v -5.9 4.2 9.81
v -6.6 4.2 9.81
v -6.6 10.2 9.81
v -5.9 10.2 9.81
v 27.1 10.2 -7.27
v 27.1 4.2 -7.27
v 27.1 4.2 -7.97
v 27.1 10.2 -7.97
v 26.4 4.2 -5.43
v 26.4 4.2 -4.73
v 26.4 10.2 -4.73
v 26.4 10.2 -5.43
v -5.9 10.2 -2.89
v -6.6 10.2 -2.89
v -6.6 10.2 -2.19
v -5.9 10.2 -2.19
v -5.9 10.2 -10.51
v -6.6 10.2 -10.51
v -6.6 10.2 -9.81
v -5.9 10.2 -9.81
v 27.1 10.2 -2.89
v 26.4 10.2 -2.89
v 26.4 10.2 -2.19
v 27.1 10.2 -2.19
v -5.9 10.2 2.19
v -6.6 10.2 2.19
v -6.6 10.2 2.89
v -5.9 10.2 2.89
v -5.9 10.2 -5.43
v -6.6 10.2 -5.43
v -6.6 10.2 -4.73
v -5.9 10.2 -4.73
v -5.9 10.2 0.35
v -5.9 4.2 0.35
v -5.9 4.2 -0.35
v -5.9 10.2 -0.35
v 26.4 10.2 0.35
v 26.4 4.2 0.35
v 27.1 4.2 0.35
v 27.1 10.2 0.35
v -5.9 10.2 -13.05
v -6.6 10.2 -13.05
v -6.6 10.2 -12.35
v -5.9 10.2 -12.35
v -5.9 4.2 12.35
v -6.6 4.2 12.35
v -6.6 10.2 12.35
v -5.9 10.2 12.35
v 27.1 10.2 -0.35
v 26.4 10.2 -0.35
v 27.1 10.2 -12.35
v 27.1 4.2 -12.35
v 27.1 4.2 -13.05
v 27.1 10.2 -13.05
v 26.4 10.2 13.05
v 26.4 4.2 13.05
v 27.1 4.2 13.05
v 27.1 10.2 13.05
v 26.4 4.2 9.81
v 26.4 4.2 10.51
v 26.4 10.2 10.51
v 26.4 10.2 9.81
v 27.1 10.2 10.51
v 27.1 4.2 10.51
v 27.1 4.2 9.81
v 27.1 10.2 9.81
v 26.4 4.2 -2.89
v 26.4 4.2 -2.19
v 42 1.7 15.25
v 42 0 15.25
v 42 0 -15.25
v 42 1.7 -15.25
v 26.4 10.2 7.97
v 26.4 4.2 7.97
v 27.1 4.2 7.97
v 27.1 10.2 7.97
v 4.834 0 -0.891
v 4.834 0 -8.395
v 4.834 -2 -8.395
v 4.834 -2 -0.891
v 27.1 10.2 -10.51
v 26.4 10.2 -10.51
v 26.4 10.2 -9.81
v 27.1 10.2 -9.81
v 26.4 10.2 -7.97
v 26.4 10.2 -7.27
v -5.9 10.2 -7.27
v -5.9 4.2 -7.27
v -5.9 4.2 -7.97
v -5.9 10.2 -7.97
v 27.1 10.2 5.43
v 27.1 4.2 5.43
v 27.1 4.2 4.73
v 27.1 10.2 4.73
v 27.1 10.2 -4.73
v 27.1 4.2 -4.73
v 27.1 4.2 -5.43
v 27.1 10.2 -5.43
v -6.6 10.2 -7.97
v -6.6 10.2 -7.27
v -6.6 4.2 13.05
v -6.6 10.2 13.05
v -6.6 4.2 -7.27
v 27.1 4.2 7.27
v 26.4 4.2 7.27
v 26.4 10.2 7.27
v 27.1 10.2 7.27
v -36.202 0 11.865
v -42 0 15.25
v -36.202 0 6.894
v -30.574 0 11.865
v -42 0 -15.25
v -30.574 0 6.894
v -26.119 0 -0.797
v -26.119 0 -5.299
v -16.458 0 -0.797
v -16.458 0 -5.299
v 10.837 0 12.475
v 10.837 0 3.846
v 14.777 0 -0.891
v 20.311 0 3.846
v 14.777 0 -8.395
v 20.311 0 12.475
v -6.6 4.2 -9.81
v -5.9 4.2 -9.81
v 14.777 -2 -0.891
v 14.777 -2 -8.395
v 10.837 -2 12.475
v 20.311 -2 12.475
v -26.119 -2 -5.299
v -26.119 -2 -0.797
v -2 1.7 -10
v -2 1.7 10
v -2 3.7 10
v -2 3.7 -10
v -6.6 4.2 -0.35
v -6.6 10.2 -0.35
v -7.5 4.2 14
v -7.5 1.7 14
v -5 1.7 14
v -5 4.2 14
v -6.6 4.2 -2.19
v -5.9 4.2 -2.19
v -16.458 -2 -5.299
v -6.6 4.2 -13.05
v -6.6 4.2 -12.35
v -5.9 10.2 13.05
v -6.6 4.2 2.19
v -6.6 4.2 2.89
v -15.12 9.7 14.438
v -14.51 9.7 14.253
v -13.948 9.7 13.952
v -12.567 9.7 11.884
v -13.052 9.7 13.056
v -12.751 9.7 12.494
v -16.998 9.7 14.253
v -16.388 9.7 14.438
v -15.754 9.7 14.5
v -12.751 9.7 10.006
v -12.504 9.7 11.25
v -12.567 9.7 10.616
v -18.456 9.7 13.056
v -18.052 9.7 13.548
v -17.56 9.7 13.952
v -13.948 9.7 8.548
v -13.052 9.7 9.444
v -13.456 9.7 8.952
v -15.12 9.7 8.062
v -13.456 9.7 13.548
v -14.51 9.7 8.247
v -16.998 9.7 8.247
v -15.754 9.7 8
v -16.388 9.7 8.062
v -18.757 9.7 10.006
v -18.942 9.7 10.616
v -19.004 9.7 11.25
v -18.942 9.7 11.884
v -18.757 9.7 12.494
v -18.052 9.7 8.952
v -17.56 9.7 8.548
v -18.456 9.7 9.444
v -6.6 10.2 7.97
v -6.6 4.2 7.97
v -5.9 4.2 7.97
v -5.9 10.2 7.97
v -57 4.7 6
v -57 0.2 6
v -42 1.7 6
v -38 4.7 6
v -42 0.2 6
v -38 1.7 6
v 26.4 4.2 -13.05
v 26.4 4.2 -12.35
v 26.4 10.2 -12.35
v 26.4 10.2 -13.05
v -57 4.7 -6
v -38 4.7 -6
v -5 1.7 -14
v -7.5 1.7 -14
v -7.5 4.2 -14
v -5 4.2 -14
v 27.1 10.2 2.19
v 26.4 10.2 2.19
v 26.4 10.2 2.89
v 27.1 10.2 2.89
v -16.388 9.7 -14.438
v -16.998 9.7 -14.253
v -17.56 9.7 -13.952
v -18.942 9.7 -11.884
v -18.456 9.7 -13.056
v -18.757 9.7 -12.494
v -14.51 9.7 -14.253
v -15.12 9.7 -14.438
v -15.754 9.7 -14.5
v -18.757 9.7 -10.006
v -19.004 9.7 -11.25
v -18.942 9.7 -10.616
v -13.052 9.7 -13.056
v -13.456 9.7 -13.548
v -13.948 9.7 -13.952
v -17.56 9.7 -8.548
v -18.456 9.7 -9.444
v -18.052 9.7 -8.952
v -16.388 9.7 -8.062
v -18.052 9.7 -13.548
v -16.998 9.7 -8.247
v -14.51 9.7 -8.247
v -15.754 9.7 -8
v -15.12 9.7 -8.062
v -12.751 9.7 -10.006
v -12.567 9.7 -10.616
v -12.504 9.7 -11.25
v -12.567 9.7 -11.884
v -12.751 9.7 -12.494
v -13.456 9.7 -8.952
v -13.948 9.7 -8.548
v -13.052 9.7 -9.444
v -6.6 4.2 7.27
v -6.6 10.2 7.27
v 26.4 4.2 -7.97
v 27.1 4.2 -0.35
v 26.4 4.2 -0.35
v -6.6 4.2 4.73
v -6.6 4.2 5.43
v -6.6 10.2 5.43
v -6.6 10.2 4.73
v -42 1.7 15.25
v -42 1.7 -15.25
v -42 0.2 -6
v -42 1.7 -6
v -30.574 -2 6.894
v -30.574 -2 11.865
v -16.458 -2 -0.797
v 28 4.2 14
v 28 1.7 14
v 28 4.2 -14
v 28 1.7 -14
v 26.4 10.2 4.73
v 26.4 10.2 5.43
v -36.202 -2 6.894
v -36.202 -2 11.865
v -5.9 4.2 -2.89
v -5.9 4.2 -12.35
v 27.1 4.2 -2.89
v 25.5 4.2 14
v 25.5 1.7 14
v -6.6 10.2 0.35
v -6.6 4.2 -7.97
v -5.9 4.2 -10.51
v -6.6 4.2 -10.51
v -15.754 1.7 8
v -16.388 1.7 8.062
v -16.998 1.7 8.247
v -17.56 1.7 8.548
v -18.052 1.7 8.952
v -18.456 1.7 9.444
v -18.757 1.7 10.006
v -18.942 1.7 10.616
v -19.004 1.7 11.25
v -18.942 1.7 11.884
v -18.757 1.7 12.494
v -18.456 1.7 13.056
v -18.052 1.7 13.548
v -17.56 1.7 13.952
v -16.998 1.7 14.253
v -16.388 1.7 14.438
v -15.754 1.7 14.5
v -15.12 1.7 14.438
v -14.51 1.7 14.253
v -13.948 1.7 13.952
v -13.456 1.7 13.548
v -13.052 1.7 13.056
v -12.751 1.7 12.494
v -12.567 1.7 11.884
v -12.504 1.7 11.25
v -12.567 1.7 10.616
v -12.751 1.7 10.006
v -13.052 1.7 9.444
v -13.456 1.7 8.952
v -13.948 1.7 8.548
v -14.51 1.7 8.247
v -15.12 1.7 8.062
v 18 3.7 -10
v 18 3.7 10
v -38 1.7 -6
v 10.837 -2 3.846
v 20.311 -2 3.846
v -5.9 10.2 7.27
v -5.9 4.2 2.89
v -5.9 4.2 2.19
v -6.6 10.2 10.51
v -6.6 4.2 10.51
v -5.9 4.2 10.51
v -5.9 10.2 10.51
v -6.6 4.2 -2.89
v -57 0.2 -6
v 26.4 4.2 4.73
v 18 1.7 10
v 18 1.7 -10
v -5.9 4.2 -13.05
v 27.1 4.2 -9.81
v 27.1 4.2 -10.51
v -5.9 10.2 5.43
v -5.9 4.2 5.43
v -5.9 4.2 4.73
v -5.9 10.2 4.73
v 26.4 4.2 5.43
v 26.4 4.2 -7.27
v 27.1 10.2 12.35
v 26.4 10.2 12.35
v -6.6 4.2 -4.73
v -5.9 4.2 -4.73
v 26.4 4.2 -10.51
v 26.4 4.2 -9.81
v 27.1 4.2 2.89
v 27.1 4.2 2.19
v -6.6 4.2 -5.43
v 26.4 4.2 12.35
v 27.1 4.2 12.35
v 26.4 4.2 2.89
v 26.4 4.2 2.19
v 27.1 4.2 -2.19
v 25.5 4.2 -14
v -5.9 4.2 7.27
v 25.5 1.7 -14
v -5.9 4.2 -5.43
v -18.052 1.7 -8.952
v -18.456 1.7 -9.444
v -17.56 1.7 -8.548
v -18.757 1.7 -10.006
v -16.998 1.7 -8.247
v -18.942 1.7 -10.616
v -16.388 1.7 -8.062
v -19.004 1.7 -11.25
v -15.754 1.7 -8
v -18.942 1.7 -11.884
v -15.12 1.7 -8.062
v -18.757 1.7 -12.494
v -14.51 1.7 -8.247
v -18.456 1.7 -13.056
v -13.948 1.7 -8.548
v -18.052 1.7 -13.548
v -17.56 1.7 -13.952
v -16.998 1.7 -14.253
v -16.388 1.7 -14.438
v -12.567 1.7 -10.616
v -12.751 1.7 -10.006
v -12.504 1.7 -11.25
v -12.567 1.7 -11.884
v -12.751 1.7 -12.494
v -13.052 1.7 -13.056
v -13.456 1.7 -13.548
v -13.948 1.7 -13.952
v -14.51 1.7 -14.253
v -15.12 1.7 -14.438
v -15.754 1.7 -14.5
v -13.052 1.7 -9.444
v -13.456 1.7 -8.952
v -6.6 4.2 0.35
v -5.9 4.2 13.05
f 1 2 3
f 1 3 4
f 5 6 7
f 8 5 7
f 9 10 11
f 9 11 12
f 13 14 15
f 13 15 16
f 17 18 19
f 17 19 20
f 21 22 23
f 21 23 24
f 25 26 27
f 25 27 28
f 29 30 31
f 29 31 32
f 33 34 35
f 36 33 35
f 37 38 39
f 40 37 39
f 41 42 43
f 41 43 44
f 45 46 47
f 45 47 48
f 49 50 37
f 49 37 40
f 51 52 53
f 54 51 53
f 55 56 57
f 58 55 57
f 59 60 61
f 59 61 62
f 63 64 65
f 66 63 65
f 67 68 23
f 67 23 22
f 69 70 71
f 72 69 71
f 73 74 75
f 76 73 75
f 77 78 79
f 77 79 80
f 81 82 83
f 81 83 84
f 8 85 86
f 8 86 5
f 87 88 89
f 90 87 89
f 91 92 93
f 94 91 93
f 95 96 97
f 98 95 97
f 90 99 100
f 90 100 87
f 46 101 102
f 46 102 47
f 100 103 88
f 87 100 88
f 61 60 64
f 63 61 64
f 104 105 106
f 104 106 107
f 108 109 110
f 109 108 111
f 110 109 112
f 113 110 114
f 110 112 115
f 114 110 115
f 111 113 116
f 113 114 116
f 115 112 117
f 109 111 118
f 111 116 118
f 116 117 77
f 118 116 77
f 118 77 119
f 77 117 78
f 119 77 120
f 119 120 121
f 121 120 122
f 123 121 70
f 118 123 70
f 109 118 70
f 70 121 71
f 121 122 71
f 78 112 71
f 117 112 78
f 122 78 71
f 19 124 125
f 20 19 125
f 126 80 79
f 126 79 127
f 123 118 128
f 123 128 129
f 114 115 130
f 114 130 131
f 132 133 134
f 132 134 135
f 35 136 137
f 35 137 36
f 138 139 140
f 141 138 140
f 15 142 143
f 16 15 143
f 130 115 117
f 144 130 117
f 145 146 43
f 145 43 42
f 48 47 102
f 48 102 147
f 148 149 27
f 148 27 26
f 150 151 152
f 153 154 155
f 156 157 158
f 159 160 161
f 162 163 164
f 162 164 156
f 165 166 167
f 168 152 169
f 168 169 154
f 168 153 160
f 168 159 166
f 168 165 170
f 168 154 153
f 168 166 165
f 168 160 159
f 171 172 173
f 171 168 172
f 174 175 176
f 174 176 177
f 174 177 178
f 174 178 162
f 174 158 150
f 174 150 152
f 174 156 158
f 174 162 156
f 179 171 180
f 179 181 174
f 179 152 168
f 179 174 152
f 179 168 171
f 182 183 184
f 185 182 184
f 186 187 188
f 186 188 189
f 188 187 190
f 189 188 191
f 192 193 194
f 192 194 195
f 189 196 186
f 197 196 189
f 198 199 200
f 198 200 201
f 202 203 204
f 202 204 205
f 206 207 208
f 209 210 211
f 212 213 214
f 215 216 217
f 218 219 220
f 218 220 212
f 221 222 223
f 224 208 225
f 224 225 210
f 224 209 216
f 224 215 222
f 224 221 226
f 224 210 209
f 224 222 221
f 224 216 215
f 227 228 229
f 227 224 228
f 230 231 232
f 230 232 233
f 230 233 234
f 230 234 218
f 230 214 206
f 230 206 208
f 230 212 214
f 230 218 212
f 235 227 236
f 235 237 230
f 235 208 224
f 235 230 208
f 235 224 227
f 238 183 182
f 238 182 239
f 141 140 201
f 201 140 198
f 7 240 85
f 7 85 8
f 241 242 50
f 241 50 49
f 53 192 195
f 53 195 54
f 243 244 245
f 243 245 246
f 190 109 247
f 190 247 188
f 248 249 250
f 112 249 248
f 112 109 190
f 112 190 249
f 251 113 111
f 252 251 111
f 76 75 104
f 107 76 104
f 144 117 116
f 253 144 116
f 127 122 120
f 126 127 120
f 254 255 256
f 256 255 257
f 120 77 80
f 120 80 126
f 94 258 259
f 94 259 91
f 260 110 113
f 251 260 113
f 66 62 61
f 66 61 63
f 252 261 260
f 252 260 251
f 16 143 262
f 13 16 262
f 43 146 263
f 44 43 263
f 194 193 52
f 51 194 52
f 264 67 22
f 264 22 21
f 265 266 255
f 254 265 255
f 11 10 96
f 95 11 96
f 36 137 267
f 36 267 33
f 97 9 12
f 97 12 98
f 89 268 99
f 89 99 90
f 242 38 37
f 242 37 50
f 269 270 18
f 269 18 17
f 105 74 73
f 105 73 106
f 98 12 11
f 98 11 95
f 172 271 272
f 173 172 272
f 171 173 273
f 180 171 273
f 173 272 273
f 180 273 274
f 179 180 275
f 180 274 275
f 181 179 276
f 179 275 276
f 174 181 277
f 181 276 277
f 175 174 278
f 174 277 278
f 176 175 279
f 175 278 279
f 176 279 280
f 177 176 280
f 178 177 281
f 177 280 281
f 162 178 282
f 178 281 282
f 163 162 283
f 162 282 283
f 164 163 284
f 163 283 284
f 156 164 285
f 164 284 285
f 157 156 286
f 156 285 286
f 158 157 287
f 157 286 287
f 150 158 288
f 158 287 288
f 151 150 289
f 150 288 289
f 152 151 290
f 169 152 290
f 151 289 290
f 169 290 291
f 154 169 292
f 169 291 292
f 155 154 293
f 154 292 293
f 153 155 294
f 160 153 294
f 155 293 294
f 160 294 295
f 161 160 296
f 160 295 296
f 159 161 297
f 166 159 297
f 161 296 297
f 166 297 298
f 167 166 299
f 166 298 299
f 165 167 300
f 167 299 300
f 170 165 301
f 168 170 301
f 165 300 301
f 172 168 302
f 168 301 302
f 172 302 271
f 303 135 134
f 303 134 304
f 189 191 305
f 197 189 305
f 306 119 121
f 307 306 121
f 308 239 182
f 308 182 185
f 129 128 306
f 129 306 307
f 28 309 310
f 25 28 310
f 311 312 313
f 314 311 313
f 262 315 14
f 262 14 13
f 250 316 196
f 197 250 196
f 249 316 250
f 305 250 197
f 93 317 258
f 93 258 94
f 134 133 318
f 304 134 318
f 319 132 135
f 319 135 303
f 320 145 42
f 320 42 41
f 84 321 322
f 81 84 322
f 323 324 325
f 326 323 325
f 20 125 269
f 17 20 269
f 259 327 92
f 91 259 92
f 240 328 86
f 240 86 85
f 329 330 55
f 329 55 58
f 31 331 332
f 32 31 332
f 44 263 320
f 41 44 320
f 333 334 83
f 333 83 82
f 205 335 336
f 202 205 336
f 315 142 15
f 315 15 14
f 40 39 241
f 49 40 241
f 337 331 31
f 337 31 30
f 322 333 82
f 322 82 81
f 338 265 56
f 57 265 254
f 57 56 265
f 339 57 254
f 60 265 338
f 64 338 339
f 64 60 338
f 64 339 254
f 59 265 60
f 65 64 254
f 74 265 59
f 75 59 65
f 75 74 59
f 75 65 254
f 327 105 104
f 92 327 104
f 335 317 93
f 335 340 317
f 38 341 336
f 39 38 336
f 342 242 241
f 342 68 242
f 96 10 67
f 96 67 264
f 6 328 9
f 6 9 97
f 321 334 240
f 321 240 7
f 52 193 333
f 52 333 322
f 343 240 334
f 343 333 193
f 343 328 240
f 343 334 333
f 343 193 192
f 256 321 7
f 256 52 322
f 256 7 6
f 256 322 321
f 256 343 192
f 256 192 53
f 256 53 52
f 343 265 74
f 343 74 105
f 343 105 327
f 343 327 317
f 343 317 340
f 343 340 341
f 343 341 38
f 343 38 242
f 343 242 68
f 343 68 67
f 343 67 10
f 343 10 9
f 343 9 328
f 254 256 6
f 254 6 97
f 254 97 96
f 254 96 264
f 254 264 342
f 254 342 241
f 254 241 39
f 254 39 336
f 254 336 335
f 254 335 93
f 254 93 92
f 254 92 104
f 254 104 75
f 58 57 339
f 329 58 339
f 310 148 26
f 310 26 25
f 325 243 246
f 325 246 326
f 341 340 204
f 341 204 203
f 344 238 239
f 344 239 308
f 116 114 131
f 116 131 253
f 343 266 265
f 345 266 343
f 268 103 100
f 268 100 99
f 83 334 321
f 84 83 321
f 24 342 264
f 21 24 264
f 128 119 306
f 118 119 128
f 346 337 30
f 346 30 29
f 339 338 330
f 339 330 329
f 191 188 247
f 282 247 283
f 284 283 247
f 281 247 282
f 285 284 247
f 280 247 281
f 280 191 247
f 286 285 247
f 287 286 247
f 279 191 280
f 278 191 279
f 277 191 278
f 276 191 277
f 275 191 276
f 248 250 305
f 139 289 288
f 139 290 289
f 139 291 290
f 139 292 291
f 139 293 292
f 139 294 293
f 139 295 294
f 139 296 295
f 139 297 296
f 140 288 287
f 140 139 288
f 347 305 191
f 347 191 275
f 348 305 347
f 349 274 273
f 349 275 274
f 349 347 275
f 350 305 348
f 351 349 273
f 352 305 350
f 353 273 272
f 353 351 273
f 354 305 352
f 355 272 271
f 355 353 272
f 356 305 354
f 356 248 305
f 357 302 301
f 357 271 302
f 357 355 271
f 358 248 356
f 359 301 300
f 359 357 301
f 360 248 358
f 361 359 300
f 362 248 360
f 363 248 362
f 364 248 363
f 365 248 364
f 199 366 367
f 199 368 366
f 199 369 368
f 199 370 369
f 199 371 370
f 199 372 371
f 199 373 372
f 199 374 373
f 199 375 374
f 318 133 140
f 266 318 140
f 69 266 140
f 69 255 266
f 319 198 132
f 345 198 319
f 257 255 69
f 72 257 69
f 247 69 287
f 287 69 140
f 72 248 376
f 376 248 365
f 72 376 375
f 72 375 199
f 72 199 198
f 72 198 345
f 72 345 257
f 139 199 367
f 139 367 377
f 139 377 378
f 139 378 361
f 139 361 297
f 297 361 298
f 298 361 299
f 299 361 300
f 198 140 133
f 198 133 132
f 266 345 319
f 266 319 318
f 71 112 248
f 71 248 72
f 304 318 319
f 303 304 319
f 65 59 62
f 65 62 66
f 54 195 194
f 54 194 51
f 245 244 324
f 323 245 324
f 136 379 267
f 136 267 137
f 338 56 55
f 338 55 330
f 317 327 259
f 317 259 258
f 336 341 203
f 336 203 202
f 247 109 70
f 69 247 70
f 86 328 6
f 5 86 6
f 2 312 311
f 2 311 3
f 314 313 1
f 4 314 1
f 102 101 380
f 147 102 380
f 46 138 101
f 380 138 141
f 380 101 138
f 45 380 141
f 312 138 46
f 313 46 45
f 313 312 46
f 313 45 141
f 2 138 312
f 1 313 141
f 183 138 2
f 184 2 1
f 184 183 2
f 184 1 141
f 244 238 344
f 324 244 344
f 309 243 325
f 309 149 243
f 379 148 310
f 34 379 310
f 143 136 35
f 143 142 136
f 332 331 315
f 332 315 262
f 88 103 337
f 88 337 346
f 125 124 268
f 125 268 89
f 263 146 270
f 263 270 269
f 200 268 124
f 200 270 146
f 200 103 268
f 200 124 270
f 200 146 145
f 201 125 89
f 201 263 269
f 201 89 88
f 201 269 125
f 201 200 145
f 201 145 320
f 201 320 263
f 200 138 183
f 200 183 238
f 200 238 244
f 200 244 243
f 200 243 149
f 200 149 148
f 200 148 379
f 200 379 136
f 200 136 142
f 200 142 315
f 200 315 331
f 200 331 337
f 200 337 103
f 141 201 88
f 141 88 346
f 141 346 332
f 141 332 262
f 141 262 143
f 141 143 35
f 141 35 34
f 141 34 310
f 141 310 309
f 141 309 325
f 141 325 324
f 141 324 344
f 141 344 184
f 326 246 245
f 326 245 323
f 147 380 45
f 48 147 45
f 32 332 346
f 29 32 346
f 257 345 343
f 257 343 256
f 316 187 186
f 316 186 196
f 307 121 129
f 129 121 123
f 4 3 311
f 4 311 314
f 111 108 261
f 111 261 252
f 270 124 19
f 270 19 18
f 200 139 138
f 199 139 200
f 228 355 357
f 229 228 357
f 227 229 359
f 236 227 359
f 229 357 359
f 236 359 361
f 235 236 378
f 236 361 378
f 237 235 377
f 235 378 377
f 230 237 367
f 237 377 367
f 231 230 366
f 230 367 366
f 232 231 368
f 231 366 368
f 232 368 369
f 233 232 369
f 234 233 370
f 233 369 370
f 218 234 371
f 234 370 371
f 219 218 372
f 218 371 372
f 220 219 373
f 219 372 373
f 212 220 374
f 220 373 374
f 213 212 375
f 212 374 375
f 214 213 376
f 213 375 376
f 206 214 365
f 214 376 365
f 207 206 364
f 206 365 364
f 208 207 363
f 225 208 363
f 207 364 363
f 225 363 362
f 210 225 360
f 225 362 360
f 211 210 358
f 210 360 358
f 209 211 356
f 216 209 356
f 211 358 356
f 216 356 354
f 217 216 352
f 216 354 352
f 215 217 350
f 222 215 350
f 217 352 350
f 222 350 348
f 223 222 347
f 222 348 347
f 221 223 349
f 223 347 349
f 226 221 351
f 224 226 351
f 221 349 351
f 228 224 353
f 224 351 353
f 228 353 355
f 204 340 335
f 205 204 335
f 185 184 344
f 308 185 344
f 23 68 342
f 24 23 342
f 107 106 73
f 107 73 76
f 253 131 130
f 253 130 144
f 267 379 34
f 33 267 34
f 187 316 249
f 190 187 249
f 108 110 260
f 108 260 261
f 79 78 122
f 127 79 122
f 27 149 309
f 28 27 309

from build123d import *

# Parameters (mm, degrees)
SKETCH1_W                = 84
SKETCH1_H                = 30.5
BOSS_EXTRUDE1_DEPTH      = 1.7
BOSS_EXTRUDE2_DEPTH      = 3
BOSS_EXTRUDE2_DEPTH_BACK = 1.5
SKETCH2_W                = 19
SKETCH2_H                = 12
SKETCH3_W                = 20
SKETCH3_H                = 20
BOSS_EXTRUDE3_DEPTH      = 2
SKETCH4_W                = 5.627780268
SKETCH4_H                = 4.971205903
SKETCH4_W_2              = 9.661022794
SKETCH4_H_2              = 4.502224215
SKETCH4_W_3              = 9.473430118
SKETCH4_H_3              = 8.629263078
SKETCH4_W_4              = 9.942411808
SKETCH4_H_4              = 7.503707025
BOSS_EXTRUDE4_DEPTH      = 2
SKETCH5_R                = 3.25
BOSS_EXTRUDE5_DEPTH      = 8
SKETCH6_W                = 2.5
SKETCH6_H                = 28
BOSS_EXTRUDE6_DEPTH      = 2.5
SKETCH7_W                = 0.7
SKETCH7_H                = 0.7
BOSS_EXTRUDE7_DEPTH      = 6


with BuildPart() as part:
    # Sketch1 → Boss-Extrude1 (new body)
    with BuildSketch(Plane(origin=(0, 0, 0), x_dir=(1, 0, 0), z_dir=(0, 1, 0))):
        Rectangle(SKETCH1_W, SKETCH1_H)
    extrude(amount=BOSS_EXTRUDE1_DEPTH)

    # Sketch2 → Boss-Extrude2 (add, two sides: drawn at the far end of the back side and taken through both)
    with BuildSketch(Plane(origin=(0, 1.7, 0), x_dir=(1, 0, 0), z_dir=(0, 1, 0)).offset(-BOSS_EXTRUDE2_DEPTH_BACK)):
        with Locations((-47.5, 0)):
            Rectangle(SKETCH2_W, SKETCH2_H)
    extrude(amount=BOSS_EXTRUDE2_DEPTH + BOSS_EXTRUDE2_DEPTH_BACK)

    # Sketch3 → Boss-Extrude3 (add)
    with BuildSketch(Plane(origin=(0, 1.7, 0), x_dir=(1, 0, 0), z_dir=(0, 1, 0))):
        with Locations((8, 0)):
            Rectangle(SKETCH3_W, SKETCH3_H)
    extrude(amount=BOSS_EXTRUDE3_DEPTH)

    # Sketch4 → Boss-Extrude4 (add)
    with BuildSketch(Plane.XZ):
        with Locations((-33.387789234, 9.379633781)):
            Rectangle(SKETCH4_W, SKETCH4_H)
        with Locations((-21.288061657, -3.048380979)):
            Rectangle(SKETCH4_W_2, SKETCH4_H_2)
        with Locations((15.5738991, 8.160281389)):
            Rectangle(SKETCH4_W_3, SKETCH4_H_3)
        with Locations((9.805424325, -4.642918722)):
            Rectangle(SKETCH4_W_4, SKETCH4_H_4)
    extrude(amount=BOSS_EXTRUDE4_DEPTH)

    # Sketch5 → Boss-Extrude5 (add)
    with BuildSketch(Plane(origin=(0, 1.7, 0), x_dir=(1, 0, 0), z_dir=(0, 1, 0))):
        with Locations(Location((-15.754077727, 11.25, 0), (0, 0, 270))):
            Circle(SKETCH5_R)
        with Locations(Location((-15.754077727, -11.25, 0), (0, 0, 90))):
            Circle(SKETCH5_R)
    extrude(amount=BOSS_EXTRUDE5_DEPTH)

    # Sketch6 → Boss-Extrude6 (add)
    with BuildSketch(Plane(origin=(0, 1.7, 0), x_dir=(1, 0, 0), z_dir=(0, 1, 0))):
        with Locations((-6.25, 0)):
            Rectangle(SKETCH6_W, SKETCH6_H)
        with Locations((26.75, 0)):
            Rectangle(SKETCH6_W, SKETCH6_H)
    extrude(amount=BOSS_EXTRUDE6_DEPTH)

    # Sketch7 → Boss-Extrude7 (add)
    with BuildSketch(Plane(origin=(0, 4.2, 0), x_dir=(1, 0, 0), z_dir=(0, 1, 0))):
        with Locations((-6.25, 2.54)):
            Rectangle(SKETCH7_W, SKETCH7_H)
        with Locations((-6.25, 0)):
            Rectangle(SKETCH7_W, SKETCH7_H)
        with Locations((-6.25, 5.08)):
            Rectangle(SKETCH7_W, SKETCH7_H)
        with Locations((-6.25, 7.62)):
            Rectangle(SKETCH7_W, SKETCH7_H)
        with Locations((-6.25, 10.16)):
            Rectangle(SKETCH7_W, SKETCH7_H)
        with Locations((-6.25, 12.7)):
            Rectangle(SKETCH7_W, SKETCH7_H)
        with Locations((-6.25, -2.54)):
            Rectangle(SKETCH7_W, SKETCH7_H)
        with Locations((-6.25, -5.08)):
            Rectangle(SKETCH7_W, SKETCH7_H)
        with Locations((-6.25, -7.62)):
            Rectangle(SKETCH7_W, SKETCH7_H)
        with Locations((-6.25, -10.16)):
            Rectangle(SKETCH7_W, SKETCH7_H)
        with Locations((-6.25, -12.7)):
            Rectangle(SKETCH7_W, SKETCH7_H)
        with Locations((26.75, 2.54)):
            Rectangle(SKETCH7_W, SKETCH7_H)
        with Locations((26.75, 10.16)):
            Rectangle(SKETCH7_W, SKETCH7_H)
        with Locations((26.75, -12.7)):
            Rectangle(SKETCH7_W, SKETCH7_H)
        with Locations((26.75, -2.54)):
            Rectangle(SKETCH7_W, SKETCH7_H)
        with Locations((26.75, 7.62)):
            Rectangle(SKETCH7_W, SKETCH7_H)
        with Locations((26.75, 12.7)):
            Rectangle(SKETCH7_W, SKETCH7_H)
        with Locations((26.75, 0)):
            Rectangle(SKETCH7_W, SKETCH7_H)
        with Locations((26.75, -5.08)):
            Rectangle(SKETCH7_W, SKETCH7_H)
        with Locations((26.75, -10.16)):
            Rectangle(SKETCH7_W, SKETCH7_H)
        with Locations((26.75, -7.62)):
            Rectangle(SKETCH7_W, SKETCH7_H)
        with Locations((26.75, 5.08)):
            Rectangle(SKETCH7_W, SKETCH7_H)
    extrude(amount=BOSS_EXTRUDE7_DEPTH)


solid = part.part
